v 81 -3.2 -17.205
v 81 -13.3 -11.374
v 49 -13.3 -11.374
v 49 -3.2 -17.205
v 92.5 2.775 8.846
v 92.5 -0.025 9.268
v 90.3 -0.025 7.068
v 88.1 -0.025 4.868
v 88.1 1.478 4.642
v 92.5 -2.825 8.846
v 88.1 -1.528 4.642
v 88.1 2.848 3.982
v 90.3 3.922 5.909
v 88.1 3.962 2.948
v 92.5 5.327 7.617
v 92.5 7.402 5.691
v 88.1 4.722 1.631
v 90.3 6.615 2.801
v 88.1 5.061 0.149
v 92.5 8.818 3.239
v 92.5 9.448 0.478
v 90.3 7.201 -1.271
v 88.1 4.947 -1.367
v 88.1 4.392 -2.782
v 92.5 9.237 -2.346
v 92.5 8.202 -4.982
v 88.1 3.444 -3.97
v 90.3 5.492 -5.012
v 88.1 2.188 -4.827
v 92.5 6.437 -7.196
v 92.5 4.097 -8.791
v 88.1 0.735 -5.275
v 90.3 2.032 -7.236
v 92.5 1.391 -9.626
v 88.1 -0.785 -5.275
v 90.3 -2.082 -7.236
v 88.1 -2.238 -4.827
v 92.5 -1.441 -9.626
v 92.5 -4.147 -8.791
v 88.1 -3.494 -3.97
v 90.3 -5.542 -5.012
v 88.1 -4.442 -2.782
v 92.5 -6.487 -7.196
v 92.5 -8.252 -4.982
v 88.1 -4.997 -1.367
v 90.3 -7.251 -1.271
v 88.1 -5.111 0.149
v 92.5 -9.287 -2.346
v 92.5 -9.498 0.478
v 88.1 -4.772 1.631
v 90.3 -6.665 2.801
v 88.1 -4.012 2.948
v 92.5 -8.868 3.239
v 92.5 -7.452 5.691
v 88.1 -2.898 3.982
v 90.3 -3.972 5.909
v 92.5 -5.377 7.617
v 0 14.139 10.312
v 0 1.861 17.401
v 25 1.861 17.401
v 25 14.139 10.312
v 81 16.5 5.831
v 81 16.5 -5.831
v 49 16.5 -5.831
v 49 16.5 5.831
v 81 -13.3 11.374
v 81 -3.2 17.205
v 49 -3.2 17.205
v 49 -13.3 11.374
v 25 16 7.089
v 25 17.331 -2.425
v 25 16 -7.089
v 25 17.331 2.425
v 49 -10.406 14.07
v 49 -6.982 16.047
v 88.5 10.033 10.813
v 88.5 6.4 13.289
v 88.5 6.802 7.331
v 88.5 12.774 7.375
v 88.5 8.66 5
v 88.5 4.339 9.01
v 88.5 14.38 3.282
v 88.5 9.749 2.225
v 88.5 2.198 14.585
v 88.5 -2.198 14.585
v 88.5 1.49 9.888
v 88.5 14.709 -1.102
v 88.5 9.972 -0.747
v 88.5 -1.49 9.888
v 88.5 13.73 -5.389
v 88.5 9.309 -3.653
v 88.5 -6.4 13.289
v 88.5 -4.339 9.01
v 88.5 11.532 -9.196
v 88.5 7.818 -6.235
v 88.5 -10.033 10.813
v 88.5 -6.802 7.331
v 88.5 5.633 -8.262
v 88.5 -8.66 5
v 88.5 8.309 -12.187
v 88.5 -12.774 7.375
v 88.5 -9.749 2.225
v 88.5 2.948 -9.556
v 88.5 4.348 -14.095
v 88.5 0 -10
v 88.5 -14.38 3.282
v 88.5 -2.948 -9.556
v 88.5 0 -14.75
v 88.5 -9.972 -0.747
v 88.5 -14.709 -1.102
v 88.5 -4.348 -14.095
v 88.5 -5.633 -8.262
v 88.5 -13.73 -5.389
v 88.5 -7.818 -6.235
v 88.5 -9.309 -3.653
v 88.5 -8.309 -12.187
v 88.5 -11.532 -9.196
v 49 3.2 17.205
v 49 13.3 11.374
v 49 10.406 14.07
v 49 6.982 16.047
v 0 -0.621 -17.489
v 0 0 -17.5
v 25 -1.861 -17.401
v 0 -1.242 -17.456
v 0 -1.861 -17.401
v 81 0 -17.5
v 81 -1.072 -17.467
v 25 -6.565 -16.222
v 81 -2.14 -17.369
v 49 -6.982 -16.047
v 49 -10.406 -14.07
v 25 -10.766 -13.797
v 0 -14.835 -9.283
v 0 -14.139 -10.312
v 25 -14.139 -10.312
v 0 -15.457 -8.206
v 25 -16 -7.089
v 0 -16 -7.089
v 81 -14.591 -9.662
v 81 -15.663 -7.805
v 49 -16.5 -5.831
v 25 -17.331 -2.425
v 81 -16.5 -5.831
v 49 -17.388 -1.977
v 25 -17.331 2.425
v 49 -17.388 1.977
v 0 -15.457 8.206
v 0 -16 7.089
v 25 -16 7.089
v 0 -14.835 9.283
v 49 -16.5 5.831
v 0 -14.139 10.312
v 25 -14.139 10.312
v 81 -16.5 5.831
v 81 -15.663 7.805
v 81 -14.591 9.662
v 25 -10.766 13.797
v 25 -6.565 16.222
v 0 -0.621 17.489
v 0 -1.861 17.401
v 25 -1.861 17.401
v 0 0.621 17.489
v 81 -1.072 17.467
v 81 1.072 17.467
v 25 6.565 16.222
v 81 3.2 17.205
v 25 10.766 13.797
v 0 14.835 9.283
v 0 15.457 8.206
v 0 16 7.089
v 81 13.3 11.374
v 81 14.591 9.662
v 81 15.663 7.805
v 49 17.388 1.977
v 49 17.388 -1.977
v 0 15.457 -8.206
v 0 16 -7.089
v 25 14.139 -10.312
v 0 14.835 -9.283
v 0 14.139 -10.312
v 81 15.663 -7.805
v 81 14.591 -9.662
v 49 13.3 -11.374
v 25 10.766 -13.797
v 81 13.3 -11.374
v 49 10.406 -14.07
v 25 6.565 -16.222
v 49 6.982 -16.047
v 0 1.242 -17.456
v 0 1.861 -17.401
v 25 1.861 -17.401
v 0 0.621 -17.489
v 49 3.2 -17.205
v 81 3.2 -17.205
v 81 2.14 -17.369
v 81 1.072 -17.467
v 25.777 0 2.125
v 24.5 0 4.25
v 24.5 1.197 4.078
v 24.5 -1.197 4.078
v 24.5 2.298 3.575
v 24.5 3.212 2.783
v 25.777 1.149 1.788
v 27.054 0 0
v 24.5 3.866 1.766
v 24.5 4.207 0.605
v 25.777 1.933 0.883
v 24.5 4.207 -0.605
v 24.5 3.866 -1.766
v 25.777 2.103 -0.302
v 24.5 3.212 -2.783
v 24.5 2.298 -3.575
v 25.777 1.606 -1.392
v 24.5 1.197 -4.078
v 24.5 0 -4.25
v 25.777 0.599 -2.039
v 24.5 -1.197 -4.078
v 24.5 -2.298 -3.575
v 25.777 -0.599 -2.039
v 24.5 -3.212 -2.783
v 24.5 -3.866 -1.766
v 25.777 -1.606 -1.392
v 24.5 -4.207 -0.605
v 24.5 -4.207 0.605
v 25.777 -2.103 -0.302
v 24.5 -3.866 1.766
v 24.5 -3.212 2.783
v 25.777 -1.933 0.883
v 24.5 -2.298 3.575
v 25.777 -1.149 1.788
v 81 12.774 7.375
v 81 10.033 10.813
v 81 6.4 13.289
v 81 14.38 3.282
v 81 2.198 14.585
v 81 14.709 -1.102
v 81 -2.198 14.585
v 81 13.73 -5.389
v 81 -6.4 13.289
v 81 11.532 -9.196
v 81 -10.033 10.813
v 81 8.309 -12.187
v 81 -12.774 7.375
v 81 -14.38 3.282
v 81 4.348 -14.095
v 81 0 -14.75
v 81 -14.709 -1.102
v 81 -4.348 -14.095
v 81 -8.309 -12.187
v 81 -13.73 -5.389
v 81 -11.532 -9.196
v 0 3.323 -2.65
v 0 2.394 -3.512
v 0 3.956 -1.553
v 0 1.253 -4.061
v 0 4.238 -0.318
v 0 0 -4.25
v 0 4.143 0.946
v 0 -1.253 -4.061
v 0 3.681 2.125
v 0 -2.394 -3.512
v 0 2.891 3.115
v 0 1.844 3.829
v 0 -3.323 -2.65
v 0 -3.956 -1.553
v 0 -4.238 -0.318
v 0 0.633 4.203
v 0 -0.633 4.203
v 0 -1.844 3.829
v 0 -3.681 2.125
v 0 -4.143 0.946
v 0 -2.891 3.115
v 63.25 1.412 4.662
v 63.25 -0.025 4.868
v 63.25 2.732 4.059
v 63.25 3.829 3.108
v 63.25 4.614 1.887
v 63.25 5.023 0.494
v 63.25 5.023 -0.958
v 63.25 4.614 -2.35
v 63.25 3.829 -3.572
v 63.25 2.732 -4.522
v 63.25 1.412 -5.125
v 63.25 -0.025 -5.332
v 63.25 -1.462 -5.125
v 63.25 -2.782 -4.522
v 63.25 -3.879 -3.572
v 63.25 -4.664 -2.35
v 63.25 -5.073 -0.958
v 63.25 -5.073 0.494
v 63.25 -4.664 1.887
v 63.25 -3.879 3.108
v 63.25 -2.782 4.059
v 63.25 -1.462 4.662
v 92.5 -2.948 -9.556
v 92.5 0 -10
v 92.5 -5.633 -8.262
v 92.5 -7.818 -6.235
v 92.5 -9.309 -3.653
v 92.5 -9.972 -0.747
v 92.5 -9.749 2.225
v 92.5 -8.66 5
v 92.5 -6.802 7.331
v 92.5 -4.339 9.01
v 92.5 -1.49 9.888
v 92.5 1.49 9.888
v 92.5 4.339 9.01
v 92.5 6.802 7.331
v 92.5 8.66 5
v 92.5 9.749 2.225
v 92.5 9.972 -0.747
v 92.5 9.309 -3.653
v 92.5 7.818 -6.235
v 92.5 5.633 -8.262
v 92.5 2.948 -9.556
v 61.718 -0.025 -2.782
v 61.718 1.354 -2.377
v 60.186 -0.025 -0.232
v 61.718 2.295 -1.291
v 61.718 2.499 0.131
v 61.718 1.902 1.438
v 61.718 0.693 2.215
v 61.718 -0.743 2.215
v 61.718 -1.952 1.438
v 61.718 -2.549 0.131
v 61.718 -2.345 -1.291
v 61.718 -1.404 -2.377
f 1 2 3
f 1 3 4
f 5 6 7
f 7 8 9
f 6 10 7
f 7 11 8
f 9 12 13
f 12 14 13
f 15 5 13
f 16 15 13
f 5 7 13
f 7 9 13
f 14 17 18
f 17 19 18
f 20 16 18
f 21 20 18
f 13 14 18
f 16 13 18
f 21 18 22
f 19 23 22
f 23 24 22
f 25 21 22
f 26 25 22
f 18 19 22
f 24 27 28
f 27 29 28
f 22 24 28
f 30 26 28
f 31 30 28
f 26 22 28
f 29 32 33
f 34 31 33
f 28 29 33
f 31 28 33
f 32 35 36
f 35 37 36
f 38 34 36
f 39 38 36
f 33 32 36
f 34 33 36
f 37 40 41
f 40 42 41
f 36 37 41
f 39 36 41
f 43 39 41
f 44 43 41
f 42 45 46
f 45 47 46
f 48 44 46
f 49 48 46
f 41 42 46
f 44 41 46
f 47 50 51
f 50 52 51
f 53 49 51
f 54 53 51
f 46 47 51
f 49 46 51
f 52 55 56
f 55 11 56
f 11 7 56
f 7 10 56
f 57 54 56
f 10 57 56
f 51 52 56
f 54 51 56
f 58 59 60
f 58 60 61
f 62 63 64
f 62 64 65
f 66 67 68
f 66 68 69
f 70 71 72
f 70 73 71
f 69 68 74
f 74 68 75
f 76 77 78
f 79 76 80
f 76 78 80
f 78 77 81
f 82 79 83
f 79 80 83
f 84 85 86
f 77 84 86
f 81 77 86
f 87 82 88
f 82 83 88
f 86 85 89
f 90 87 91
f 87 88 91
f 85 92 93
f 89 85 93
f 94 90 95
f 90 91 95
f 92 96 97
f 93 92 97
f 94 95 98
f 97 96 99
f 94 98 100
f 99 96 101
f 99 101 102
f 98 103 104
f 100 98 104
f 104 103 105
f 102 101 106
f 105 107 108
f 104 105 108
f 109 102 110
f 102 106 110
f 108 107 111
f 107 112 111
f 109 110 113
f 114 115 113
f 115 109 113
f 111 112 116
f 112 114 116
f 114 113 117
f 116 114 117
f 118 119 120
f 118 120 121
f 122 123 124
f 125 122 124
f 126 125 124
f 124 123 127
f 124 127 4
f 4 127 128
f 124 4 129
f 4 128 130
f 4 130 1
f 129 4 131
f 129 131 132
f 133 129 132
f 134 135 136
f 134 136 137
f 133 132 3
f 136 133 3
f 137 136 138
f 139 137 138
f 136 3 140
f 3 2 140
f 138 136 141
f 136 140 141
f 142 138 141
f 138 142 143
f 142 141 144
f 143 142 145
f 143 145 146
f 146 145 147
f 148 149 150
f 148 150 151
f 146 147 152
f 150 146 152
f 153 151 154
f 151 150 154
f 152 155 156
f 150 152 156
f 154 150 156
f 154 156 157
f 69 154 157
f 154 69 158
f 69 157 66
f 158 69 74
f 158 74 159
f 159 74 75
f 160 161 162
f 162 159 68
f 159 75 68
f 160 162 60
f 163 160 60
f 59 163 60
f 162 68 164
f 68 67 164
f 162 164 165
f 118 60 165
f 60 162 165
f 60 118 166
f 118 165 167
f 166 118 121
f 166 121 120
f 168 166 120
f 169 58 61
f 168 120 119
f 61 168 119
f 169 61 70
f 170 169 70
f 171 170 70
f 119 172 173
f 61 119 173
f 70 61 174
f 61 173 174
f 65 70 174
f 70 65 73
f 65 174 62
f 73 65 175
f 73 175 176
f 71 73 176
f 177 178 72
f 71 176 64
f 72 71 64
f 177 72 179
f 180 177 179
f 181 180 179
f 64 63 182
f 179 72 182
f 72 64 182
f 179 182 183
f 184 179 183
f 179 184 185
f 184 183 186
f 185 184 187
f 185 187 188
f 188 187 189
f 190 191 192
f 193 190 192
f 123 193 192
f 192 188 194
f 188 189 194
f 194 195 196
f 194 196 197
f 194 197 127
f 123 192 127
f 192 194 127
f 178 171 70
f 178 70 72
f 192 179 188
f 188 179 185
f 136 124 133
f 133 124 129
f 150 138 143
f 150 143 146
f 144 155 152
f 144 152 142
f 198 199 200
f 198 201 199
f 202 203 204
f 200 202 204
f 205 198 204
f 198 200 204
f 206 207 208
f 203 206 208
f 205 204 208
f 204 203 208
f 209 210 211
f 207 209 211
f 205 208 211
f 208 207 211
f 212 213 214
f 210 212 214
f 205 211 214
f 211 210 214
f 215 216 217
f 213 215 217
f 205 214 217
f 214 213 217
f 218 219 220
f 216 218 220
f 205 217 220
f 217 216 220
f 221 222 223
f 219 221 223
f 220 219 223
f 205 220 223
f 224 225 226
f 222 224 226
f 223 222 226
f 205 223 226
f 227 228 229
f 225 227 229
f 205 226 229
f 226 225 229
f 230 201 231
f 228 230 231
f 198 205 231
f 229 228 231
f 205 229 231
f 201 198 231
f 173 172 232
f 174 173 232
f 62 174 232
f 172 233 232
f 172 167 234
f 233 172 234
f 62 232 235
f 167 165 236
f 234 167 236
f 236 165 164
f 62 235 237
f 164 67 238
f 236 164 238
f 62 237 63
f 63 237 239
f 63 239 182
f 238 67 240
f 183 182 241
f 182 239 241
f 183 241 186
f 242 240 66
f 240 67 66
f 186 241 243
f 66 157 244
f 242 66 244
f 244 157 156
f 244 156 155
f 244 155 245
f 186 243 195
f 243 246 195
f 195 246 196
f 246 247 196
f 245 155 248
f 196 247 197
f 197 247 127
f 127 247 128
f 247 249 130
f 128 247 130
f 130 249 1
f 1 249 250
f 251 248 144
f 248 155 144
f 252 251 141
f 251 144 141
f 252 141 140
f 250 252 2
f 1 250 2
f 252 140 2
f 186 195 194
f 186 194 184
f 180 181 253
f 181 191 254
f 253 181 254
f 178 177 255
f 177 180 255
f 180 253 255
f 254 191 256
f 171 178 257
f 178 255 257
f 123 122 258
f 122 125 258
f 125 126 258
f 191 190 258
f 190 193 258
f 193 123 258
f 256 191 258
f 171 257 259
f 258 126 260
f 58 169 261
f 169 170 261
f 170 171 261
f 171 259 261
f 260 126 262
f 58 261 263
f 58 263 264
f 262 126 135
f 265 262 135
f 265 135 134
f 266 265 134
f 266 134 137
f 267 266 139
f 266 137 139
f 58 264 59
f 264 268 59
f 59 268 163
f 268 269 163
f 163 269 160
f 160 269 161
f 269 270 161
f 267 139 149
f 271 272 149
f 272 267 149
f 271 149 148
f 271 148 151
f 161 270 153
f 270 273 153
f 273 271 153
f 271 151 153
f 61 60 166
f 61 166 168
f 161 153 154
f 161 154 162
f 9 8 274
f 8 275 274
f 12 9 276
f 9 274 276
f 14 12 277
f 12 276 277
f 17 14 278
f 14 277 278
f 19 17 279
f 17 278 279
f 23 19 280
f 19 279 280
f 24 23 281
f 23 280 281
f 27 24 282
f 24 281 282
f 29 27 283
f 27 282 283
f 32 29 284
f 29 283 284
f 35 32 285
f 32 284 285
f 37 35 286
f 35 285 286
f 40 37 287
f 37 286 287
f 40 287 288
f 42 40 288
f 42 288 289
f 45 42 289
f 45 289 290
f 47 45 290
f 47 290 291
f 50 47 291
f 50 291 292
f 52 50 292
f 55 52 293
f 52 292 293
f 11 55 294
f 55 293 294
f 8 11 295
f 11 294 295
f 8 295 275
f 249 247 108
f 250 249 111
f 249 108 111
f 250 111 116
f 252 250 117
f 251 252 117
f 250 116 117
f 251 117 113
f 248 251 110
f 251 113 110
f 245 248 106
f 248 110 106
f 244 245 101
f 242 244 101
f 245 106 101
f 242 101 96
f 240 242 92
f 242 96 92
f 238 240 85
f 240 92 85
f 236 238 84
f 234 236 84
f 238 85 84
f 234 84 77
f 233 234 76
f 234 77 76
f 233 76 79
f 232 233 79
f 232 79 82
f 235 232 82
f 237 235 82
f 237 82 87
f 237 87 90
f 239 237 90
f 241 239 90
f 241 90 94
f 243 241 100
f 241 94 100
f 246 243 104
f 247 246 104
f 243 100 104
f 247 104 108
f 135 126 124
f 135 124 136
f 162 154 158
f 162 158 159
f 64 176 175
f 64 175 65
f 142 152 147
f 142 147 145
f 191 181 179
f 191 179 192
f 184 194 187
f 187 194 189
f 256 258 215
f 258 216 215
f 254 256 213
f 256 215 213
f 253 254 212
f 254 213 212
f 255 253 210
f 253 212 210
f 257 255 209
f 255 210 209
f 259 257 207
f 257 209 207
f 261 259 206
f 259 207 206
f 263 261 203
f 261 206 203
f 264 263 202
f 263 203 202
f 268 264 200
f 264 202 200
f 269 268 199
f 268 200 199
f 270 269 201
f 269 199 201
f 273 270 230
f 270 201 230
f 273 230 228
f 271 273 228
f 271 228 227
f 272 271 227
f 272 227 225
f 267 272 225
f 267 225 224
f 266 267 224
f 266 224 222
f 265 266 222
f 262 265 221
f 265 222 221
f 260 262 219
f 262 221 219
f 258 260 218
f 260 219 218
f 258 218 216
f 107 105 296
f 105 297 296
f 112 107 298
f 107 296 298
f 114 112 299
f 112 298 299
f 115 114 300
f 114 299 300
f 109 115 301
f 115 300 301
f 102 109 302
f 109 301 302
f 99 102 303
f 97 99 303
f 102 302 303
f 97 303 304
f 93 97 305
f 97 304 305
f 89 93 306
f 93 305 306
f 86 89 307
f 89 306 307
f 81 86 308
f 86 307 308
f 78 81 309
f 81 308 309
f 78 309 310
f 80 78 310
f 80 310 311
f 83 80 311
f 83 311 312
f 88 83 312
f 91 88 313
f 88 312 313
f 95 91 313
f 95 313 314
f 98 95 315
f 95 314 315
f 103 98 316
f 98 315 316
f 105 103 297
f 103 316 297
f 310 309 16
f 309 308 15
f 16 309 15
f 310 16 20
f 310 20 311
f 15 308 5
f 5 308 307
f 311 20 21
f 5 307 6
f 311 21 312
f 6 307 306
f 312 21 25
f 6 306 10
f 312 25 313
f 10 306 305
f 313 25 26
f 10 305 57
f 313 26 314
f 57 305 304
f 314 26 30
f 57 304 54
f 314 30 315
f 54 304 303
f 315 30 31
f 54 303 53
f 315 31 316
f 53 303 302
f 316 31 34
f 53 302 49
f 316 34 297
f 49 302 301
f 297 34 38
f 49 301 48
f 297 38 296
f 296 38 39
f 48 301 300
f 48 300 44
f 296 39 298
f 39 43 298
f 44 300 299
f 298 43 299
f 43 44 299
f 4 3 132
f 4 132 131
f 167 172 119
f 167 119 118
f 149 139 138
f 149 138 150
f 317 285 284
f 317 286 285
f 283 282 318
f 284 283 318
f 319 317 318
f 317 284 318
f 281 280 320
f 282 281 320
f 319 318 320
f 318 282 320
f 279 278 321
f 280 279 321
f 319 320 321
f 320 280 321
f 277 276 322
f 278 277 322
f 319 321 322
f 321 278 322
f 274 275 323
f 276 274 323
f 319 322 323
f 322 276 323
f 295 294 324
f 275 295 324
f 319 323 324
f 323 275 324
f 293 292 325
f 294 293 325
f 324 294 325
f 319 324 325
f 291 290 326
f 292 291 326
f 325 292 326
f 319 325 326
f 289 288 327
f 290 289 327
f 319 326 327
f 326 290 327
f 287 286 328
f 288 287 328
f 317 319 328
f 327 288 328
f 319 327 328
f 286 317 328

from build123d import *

# Parameters (mm, degrees)
SKETCH5_OUTSIDE_W                 = 57.982
SKETCH5_OUTSIDE_H                 = 57.982
CUT_EXTRUDE3_DEPTH                = 25
M10X1_5_TAPPED_HOLE1_D            = 8.5
M10X1_5_TAPPED_HOLE1_DEPTH        = 24.5
M10X1_5_TAPPED_HOLE1_TIP          = 2.553657631
SKETCH9_OUTSIDE_W                 = 57.982
SKETCH9_OUTSIDE_H                 = 57.982
CUT_EXTRUDE5_DEPTH                = 32
M12X1_75_TAPPED_HOLE1_D           = 10.2
M12X1_75_TAPPED_HOLE1_DEPTH       = 29.25
M12X1_75_TAPPED_HOLE1_CSINK_D     = 19
M12X1_75_TAPPED_HOLE1_CSINK_ANGLE = 90
M12X1_75_TAPPED_HOLE1_TIP         = 3.064389157


with BuildPart() as part:
    # Sketch1 → Revolve1 (revolve)
    with BuildSketch(Plane.XY, mode=Mode.PRIVATE) as revolve1_sk:
        Polygon((0, 0), (0, 17.5), (81, 17.5), (81, 14.75), (88.5, 14.75), (88.5, 10), (92.5, 10), (92.5, 0), (81, 0), align=None)
    revolve(revolve1_sk.sketch.rotate(Axis((0, 0, 0), (-1, 0, 0)), 90), axis=Axis((0, 0, 0), (-1, 0, 0)))

    # Sketch5 outside → Cut-Extrude3 (cut)
    with BuildSketch(Plane.ZY):
        Rectangle(SKETCH5_OUTSIDE_W, SKETCH5_OUTSIDE_H)
        Polygon((9.237604307, 16), (-9.237604307, 16), (-18.475208614, 0), (-9.237604307, -16), (9.237604307, -16), (18.475208614, 0), align=None, mode=Mode.SUBTRACT)
    extrude(amount=-CUT_EXTRUDE3_DEPTH, mode=Mode.SUBTRACT)

    # M10x1.5 Tapped Hole1
    with Locations(Plane.ZY):
        with Locations((0, 0)):
            Hole(M10X1_5_TAPPED_HOLE1_D / 2, depth=M10X1_5_TAPPED_HOLE1_DEPTH)
            with Locations((0, 0, -(M10X1_5_TAPPED_HOLE1_DEPTH + M10X1_5_TAPPED_HOLE1_TIP / 2))):  # 118° drill point
                Cone(0, M10X1_5_TAPPED_HOLE1_D / 2, M10X1_5_TAPPED_HOLE1_TIP, mode=Mode.SUBTRACT)

    # Sketch9 outside → Cut-Extrude5 (cut)
    with BuildSketch(Plane(origin=(81, 0, 0), x_dir=(0, 0, -1), z_dir=(1, 0, 0))):
        Rectangle(SKETCH9_OUTSIDE_W, SKETCH9_OUTSIDE_H)
        Polygon((-9.526279442, -16.5), (9.526279442, -16.5), (19.052558883, 0), (9.526279442, 16.5), (-9.526279442, 16.5), (-19.052558883, 0), align=None, mode=Mode.SUBTRACT)
    extrude(amount=-CUT_EXTRUDE5_DEPTH, mode=Mode.SUBTRACT)

    # M12x1.75 Tapped Hole1
    with Locations(Plane(origin=(92.5, 0, 0), x_dir=(0, 0, -1), z_dir=(1, 0, 0))):
        with Locations((0.231792895, -0.025036362)):
            CounterSinkHole(M12X1_75_TAPPED_HOLE1_D / 2, M12X1_75_TAPPED_HOLE1_CSINK_D / 2, depth=M12X1_75_TAPPED_HOLE1_DEPTH, counter_sink_angle=M12X1_75_TAPPED_HOLE1_CSINK_ANGLE)
            with Locations((0, 0, -(M12X1_75_TAPPED_HOLE1_DEPTH + M12X1_75_TAPPED_HOLE1_TIP / 2))):  # 118° drill point
                Cone(0, M12X1_75_TAPPED_HOLE1_D / 2, M12X1_75_TAPPED_HOLE1_TIP, mode=Mode.SUBTRACT)


solid = part.part
